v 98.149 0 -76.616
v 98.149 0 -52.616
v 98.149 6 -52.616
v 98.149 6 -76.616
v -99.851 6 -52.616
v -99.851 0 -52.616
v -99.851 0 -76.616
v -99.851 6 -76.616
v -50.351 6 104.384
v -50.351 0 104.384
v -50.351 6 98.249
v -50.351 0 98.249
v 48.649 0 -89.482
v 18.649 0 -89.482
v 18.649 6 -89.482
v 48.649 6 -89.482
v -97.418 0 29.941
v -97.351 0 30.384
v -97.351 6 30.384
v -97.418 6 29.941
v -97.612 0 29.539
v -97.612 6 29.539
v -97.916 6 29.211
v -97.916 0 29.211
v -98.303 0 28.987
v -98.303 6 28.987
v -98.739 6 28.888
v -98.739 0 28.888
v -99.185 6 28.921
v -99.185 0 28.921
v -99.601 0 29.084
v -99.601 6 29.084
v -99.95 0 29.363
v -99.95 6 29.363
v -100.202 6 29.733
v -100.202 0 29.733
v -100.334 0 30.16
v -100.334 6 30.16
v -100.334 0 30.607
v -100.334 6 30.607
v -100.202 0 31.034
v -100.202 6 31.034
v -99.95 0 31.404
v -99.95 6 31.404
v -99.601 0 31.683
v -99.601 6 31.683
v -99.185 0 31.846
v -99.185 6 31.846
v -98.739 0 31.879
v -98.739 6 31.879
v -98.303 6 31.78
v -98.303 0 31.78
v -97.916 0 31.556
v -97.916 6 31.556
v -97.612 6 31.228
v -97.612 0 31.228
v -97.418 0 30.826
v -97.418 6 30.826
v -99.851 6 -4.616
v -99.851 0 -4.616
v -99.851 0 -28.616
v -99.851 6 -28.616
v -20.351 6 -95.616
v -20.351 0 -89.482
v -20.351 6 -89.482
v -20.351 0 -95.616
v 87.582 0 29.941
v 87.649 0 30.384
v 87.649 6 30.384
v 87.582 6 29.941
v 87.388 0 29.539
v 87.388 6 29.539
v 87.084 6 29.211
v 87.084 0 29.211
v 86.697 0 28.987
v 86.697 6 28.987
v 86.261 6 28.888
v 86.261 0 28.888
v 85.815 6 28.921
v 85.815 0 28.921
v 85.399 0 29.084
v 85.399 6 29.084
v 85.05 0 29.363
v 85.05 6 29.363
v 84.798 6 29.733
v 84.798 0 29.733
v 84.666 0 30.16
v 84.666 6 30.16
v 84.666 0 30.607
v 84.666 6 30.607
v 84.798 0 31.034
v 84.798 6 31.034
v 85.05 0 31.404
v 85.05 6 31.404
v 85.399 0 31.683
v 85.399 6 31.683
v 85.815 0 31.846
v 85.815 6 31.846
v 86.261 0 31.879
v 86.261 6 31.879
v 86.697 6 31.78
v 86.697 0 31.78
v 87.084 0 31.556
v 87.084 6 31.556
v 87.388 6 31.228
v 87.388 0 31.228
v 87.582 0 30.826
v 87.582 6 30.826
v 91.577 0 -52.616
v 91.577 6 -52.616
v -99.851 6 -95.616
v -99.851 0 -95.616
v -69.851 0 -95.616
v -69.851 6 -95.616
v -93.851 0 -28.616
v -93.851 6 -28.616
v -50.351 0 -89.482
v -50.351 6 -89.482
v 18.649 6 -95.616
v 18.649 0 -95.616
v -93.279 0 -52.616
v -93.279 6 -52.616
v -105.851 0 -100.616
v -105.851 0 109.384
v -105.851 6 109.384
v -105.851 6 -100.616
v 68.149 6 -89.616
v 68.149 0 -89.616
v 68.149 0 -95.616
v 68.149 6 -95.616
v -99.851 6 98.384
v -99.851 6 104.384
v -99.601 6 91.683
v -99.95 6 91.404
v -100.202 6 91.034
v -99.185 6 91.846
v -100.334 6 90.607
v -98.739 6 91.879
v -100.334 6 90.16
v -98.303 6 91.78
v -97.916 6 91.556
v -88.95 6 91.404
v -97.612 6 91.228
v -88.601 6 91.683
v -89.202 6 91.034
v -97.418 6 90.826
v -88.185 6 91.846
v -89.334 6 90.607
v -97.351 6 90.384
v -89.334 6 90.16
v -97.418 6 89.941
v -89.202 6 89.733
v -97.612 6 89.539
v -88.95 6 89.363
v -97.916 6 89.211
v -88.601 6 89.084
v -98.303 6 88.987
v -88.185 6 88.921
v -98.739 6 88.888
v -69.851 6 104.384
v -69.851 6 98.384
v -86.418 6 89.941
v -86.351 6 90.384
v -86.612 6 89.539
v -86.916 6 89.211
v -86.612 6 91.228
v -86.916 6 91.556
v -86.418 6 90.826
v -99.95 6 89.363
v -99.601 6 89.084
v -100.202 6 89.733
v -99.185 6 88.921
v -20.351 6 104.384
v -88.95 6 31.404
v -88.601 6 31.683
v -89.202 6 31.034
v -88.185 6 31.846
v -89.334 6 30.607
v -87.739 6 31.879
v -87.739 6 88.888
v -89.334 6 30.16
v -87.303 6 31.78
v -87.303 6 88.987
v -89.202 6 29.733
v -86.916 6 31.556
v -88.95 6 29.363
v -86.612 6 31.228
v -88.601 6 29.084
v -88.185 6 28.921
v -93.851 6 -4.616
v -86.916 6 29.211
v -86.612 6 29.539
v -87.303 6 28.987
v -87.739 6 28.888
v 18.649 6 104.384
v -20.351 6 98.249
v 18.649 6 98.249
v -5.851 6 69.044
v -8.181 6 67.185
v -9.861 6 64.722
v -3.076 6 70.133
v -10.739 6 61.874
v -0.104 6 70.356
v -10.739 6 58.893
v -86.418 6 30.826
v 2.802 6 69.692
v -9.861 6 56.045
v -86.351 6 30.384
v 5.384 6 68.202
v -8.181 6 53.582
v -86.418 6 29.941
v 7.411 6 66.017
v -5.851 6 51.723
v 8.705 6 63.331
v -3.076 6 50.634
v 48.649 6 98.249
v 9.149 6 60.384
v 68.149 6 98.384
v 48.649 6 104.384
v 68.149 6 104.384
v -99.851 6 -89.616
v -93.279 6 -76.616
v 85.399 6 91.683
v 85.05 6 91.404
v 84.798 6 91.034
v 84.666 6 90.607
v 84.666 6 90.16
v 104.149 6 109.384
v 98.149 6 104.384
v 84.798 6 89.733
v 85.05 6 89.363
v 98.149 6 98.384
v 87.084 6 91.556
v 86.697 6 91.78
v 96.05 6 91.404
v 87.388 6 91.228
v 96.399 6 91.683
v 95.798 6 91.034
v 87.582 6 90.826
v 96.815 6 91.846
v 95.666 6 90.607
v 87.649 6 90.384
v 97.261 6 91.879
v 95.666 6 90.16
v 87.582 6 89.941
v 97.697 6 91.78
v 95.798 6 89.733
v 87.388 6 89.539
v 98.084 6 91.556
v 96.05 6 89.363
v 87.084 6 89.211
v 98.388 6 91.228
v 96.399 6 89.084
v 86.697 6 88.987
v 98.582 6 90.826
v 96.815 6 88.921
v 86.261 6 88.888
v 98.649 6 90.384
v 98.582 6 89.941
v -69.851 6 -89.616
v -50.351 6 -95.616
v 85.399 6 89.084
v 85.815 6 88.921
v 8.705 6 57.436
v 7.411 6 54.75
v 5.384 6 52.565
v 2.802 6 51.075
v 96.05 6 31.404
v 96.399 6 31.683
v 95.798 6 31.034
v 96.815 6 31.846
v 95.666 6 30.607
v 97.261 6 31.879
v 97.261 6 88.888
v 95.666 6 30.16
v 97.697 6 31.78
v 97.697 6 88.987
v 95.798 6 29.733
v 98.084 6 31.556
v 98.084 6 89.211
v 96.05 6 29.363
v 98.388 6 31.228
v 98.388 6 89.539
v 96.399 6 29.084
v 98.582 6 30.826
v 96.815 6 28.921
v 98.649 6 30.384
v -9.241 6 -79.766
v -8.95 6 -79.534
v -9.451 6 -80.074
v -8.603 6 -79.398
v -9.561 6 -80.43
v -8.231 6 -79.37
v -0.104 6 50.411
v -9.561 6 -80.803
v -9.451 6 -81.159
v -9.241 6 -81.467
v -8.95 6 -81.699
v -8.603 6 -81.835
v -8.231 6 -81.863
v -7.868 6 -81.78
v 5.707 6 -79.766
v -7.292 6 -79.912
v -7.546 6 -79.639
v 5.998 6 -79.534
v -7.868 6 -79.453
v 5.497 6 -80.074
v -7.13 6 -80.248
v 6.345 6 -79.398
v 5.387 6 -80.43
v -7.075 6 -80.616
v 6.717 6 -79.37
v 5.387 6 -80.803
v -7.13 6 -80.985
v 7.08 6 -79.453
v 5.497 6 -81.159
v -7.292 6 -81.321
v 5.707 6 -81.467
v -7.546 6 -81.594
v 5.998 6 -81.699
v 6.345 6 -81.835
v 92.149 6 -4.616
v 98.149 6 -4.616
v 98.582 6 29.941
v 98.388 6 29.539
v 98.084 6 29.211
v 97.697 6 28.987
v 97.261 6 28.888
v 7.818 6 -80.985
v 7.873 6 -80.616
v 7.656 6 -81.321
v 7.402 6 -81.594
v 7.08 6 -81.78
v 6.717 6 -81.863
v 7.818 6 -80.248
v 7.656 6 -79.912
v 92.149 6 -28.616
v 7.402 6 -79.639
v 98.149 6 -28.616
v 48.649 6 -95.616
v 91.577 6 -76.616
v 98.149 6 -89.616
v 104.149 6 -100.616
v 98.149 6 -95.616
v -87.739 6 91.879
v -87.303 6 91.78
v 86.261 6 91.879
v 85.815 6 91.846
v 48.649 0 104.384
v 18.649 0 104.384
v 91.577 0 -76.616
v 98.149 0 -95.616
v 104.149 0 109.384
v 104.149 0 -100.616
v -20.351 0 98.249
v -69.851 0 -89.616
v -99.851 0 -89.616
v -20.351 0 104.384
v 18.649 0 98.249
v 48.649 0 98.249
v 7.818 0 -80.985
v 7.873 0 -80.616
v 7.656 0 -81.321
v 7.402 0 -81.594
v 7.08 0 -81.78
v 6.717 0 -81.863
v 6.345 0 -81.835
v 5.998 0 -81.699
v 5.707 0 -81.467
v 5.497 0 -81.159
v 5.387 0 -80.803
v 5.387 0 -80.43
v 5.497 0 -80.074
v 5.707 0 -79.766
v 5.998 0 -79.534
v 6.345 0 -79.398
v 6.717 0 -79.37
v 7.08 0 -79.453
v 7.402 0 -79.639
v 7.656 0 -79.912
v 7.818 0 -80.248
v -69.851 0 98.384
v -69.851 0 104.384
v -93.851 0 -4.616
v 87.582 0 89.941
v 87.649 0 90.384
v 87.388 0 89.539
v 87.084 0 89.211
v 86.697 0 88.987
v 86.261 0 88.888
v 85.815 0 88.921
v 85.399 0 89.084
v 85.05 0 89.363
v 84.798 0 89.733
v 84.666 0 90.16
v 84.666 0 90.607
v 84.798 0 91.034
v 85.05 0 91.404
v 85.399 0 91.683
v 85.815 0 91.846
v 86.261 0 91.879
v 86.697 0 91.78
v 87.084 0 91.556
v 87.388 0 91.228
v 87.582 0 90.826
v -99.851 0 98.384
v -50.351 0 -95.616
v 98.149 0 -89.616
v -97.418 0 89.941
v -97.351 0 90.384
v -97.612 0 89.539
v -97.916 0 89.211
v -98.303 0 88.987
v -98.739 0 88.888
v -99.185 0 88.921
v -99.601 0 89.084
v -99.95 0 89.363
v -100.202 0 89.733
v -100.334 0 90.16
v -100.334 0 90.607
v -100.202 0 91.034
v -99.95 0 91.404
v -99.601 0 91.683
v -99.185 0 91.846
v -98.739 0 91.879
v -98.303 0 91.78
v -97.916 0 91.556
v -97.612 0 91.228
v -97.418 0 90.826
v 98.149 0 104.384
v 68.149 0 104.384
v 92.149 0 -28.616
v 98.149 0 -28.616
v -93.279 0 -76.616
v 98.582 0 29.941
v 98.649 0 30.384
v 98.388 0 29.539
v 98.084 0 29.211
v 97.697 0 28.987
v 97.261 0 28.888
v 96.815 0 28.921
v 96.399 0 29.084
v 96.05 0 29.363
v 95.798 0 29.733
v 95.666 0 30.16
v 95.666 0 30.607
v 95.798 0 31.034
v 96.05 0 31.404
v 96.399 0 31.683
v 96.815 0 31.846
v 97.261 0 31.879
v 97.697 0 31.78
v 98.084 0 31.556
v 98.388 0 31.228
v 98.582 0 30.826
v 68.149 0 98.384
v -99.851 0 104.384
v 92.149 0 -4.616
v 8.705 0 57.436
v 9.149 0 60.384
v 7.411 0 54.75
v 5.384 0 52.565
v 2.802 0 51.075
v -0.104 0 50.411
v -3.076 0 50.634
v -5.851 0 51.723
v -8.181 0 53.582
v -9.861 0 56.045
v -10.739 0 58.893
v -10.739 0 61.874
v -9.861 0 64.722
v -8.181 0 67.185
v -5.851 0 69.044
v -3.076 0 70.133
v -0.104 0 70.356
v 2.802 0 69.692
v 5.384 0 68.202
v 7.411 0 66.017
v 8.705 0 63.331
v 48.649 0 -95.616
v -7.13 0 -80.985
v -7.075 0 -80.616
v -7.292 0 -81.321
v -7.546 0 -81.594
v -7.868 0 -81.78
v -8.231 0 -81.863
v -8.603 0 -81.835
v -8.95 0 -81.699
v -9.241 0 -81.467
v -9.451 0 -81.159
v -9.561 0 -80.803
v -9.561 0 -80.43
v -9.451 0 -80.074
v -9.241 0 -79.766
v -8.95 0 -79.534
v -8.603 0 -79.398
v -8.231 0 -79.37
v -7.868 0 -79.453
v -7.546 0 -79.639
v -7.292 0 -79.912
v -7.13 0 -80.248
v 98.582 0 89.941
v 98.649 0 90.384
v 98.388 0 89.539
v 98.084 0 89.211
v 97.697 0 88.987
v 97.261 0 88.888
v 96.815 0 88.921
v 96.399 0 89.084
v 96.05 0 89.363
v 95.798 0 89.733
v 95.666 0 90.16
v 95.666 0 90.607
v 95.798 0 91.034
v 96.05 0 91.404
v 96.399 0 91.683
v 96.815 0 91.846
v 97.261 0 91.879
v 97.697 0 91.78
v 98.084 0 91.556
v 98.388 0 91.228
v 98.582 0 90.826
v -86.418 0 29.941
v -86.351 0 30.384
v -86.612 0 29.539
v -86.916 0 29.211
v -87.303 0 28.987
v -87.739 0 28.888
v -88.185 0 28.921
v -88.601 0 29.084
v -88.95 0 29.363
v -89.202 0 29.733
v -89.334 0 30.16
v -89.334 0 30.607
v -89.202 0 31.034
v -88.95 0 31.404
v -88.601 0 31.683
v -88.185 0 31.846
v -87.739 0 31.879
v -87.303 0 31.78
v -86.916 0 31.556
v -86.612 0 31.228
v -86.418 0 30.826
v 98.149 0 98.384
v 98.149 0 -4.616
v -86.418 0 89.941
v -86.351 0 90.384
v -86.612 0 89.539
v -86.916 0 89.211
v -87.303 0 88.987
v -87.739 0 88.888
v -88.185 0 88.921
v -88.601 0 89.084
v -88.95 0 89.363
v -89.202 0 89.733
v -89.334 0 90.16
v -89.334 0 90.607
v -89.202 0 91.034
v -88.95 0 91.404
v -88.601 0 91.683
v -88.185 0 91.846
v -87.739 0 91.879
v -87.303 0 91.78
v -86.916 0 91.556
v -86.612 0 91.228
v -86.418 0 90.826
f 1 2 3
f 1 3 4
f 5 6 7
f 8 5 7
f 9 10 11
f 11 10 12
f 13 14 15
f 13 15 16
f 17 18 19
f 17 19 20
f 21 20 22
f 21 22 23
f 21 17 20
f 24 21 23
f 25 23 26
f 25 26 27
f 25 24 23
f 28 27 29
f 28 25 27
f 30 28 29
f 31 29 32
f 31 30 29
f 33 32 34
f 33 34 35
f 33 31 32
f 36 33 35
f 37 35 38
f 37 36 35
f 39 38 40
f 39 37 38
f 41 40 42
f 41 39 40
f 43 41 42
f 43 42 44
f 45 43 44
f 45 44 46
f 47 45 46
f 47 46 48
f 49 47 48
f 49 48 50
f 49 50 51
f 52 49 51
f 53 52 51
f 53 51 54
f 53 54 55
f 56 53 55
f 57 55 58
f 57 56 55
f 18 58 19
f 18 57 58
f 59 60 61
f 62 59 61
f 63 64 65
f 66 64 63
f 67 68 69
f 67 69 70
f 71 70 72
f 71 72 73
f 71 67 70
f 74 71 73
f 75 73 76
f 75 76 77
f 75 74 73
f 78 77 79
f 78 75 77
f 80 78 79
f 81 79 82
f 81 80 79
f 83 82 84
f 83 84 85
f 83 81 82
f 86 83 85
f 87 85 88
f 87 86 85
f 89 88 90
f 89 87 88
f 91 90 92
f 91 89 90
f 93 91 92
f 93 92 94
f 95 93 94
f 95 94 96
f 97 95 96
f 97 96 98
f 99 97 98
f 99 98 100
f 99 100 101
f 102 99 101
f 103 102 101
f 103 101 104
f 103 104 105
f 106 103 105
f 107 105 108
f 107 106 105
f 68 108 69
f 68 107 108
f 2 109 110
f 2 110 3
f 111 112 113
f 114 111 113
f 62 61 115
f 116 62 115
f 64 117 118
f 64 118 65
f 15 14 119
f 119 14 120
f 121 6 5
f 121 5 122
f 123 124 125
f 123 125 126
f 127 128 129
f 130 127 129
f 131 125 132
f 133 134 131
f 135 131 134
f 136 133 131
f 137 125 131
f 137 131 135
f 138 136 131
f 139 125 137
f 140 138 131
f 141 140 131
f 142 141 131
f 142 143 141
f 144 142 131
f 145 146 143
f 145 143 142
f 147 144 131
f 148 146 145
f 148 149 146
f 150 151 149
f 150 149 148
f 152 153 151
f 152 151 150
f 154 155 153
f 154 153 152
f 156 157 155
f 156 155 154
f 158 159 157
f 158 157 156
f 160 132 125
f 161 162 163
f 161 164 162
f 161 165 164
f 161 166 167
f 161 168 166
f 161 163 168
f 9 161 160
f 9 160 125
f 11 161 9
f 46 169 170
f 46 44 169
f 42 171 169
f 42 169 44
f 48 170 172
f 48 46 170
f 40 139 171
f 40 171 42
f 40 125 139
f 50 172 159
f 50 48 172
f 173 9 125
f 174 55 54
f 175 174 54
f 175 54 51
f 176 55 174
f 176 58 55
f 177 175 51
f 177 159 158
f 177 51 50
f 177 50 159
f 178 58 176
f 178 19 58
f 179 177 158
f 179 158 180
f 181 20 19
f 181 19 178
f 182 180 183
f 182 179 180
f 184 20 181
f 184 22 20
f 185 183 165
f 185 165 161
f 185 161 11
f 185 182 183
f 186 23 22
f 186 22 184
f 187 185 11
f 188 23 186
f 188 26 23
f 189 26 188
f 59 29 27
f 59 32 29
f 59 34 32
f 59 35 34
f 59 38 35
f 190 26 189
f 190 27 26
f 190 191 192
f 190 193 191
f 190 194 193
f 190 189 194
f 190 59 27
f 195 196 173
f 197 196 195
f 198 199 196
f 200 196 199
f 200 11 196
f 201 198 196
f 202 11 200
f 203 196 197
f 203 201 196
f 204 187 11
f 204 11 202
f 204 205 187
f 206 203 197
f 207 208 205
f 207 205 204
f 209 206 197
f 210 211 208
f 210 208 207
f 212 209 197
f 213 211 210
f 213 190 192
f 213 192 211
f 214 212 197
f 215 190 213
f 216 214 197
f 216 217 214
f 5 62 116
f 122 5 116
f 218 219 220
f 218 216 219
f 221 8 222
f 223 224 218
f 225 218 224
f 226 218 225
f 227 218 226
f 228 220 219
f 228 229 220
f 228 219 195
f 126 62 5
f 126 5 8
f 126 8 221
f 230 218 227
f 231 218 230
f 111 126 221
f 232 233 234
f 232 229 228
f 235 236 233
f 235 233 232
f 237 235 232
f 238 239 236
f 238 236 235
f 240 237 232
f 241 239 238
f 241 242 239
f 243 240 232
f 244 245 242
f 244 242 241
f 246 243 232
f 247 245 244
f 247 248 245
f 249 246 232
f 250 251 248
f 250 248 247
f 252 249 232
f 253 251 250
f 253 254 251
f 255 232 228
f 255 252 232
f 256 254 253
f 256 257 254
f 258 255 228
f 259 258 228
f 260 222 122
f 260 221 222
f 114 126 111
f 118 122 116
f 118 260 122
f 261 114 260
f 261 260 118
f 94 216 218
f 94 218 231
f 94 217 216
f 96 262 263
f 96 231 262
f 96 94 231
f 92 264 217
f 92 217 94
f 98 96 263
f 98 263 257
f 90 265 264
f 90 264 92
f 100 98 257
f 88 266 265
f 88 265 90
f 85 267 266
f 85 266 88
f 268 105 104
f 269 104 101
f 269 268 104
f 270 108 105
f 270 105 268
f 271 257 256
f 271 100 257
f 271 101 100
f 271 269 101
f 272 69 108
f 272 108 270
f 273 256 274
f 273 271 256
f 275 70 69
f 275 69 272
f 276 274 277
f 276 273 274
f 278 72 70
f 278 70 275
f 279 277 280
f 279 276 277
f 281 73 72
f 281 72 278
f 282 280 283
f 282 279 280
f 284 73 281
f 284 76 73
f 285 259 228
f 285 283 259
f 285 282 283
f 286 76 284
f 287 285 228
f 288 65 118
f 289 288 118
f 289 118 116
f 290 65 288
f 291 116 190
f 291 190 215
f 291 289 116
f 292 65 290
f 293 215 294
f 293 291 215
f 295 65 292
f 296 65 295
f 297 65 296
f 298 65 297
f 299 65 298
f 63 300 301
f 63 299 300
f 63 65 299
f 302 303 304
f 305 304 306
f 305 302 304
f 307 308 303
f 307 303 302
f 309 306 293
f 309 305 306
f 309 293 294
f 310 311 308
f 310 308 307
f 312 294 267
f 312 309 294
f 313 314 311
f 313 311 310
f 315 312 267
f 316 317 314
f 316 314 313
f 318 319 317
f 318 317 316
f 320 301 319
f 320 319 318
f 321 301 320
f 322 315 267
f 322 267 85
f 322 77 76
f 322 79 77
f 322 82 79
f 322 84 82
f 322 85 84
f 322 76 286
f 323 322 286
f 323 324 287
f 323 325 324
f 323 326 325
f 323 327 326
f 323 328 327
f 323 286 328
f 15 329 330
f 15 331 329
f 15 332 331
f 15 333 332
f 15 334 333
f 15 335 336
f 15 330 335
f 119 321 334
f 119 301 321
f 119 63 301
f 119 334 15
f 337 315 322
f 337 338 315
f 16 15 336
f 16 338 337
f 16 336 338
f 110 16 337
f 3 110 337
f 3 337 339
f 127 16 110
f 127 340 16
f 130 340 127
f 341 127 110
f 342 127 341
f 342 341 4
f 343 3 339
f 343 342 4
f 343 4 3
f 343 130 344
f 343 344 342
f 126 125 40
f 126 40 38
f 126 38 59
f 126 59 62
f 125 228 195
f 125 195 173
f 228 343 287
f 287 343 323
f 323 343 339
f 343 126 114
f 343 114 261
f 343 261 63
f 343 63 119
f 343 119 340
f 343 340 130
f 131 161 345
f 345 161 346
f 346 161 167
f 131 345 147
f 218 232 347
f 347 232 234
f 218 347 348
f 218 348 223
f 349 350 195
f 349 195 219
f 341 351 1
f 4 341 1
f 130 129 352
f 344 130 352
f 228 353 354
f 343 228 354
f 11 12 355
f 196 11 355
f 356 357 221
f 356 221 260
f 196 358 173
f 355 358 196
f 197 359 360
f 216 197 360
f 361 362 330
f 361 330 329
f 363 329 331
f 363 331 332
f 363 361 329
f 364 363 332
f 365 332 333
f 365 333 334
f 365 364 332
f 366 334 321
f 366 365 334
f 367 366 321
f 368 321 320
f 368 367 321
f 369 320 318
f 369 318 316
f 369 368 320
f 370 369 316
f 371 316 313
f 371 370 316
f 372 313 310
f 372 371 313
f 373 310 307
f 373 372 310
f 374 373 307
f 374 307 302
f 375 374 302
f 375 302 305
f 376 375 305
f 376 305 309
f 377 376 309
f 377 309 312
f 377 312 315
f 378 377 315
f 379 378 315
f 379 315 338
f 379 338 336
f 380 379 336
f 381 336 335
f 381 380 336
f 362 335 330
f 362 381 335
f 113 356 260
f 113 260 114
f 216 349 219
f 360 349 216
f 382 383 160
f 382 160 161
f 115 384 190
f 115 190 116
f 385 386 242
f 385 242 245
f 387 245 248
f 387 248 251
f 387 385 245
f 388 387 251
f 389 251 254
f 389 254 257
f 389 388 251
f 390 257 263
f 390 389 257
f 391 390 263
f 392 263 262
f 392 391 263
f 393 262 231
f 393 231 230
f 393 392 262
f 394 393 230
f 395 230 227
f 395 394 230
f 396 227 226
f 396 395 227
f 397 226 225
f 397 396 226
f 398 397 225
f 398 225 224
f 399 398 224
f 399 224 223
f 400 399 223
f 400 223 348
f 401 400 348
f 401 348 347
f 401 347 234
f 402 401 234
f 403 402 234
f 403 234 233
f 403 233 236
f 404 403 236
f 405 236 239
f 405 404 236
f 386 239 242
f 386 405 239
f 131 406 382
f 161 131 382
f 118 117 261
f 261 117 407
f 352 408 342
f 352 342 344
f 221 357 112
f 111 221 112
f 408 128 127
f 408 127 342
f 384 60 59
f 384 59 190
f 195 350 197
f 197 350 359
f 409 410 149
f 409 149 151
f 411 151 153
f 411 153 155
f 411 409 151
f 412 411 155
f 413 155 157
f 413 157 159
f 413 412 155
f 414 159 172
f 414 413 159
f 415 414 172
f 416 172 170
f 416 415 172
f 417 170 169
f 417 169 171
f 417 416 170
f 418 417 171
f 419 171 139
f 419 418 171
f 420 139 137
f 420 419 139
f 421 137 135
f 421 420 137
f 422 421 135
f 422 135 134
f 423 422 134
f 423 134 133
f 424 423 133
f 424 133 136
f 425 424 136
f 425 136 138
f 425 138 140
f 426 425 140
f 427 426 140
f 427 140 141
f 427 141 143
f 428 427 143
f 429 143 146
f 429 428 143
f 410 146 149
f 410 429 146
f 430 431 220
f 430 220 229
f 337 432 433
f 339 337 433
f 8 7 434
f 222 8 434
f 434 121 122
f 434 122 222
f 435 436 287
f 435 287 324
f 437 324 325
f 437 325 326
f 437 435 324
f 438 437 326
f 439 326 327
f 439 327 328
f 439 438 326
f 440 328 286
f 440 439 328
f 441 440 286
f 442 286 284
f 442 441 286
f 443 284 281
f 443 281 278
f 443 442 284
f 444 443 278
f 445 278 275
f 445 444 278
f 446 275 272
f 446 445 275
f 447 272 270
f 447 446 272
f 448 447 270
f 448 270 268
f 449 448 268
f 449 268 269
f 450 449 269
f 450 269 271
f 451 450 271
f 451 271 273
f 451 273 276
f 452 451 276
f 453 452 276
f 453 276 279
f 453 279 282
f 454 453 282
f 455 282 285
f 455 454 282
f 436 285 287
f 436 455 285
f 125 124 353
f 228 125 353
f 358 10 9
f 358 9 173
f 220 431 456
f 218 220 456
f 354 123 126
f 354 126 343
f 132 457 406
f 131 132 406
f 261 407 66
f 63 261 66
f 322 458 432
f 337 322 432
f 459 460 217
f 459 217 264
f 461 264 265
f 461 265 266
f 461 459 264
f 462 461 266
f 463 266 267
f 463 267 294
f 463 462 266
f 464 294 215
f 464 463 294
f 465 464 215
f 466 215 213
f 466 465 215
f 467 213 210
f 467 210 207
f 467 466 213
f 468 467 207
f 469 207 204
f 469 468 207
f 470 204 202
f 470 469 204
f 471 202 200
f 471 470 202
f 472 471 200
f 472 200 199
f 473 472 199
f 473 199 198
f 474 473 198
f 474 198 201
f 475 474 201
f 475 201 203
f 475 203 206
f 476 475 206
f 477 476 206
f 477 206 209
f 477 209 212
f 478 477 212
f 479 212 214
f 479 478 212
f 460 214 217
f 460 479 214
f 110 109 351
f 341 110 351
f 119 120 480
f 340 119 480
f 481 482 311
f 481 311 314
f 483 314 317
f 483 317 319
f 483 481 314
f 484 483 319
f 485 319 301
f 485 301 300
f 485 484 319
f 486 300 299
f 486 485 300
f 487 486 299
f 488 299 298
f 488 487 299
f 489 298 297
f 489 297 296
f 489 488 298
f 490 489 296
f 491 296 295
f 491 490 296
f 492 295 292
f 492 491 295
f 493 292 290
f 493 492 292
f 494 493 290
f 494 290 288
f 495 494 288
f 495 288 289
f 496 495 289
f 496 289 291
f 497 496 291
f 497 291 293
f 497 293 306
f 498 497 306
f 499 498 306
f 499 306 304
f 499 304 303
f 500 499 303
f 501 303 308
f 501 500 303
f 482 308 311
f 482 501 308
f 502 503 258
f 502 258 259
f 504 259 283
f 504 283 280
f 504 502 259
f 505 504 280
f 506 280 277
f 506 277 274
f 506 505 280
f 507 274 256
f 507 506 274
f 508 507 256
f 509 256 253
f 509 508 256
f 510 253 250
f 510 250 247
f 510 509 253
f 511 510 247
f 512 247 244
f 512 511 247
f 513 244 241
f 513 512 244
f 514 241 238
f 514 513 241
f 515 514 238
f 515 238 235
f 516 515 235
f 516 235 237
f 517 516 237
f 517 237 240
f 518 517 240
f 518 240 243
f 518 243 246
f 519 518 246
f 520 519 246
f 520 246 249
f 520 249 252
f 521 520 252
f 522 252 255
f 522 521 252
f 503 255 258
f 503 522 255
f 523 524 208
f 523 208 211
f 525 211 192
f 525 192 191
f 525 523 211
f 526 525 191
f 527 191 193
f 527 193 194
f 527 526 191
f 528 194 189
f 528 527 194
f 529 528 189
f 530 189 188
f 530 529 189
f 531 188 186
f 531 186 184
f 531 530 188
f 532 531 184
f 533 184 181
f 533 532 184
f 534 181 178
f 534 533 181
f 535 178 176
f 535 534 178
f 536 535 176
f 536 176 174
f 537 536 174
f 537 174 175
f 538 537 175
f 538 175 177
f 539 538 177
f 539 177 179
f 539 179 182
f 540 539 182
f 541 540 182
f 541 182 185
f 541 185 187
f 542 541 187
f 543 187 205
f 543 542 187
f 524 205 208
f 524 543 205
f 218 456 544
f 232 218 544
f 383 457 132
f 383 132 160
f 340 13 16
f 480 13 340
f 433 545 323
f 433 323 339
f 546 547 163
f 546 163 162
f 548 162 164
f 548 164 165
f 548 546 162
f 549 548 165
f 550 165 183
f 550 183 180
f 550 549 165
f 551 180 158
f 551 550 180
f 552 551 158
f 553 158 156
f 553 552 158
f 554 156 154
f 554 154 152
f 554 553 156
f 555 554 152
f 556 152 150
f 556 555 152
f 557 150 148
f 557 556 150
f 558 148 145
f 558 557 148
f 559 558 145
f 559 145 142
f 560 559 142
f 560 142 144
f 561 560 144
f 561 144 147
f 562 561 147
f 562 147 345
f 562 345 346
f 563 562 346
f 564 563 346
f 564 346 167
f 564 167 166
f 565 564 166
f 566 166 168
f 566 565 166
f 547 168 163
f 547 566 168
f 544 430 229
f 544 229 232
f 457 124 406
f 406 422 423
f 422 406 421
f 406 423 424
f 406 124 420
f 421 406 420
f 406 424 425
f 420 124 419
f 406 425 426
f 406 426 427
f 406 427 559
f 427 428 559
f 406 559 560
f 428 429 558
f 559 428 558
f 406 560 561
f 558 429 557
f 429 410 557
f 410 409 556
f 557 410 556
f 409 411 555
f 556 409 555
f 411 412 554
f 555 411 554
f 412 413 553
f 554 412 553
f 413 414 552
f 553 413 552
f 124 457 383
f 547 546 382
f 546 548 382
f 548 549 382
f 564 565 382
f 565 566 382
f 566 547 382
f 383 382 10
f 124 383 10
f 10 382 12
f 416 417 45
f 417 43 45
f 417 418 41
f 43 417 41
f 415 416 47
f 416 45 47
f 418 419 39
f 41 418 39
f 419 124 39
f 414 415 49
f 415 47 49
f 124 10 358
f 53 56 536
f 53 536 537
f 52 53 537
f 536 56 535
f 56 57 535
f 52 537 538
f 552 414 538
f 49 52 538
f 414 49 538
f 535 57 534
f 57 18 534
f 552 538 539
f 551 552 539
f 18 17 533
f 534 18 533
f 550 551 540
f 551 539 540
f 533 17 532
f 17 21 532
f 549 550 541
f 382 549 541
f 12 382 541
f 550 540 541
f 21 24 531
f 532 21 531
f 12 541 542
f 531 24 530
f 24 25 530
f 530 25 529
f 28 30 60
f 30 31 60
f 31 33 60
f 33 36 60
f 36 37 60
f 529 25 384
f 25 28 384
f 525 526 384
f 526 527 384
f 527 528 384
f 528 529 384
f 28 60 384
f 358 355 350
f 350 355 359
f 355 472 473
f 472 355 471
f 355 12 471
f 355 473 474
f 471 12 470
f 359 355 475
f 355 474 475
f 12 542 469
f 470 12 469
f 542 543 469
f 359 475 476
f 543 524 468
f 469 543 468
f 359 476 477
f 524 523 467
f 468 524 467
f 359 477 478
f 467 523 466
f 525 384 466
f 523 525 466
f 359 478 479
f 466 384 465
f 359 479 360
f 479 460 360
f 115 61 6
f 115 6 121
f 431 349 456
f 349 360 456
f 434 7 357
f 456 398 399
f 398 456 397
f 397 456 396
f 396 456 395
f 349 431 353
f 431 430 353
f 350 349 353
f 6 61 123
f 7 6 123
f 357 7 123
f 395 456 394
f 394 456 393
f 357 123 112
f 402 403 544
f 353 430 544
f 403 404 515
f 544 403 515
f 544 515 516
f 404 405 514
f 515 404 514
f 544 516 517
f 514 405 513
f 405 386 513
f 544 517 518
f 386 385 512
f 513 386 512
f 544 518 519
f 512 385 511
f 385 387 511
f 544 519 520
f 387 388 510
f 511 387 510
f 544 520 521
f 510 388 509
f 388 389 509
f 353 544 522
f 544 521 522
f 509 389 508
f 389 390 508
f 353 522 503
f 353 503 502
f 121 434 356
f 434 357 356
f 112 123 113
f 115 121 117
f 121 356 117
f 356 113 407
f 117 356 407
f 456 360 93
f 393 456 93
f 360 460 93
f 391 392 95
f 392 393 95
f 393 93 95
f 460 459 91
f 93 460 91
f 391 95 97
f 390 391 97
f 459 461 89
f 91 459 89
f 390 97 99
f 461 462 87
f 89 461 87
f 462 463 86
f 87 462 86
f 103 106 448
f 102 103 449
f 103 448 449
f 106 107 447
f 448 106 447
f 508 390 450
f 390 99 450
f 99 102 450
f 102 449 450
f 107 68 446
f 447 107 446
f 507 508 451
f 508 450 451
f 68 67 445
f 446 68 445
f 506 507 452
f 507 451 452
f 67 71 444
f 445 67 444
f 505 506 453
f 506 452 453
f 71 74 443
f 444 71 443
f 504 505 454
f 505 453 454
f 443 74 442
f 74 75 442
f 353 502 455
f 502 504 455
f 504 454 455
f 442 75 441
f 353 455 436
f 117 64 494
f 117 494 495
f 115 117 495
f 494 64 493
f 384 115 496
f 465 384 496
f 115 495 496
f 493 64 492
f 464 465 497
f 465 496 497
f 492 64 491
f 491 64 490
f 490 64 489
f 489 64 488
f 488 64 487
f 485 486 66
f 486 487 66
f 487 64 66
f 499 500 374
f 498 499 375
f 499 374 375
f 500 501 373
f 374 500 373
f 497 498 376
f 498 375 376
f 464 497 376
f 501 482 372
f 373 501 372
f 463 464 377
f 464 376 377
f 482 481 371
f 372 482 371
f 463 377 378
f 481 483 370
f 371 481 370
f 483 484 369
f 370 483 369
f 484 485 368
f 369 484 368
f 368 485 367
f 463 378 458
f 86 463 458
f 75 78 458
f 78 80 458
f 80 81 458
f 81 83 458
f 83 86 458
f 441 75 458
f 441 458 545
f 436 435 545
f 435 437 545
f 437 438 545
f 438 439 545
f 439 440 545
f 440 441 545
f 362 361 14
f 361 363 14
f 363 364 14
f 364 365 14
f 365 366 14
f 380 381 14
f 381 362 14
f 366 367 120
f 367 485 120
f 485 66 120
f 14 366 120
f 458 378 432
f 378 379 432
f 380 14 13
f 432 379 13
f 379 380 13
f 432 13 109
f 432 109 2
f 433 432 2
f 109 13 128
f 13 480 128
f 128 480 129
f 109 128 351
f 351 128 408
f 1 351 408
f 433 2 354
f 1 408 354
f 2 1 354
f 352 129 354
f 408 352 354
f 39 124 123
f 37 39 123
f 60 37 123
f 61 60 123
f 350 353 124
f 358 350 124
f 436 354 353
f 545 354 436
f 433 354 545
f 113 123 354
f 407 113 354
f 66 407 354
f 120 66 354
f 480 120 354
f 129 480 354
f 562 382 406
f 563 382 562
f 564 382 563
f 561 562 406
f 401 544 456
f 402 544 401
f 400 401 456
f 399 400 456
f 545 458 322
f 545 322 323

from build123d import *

# Parameters (mm, degrees)
SKETCH1_W           = 210
SKETCH1_H           = 210
SKETCH1_R           = 1.5
SKETCH1_R_2         = 10
SKETCH1_R_3         = 1.25
SKETCH1_W_2         = 30
SKETCH1_H_2         = 6.134133664
SKETCH1_H_3         = 6
SKETCH1_W_3         = 6.572229622
SKETCH1_H_4         = 24
SKETCH1_W_4         = 6
BOSS_EXTRUDE1_DEPTH = 6


with BuildPart() as part:
    # Sketch1 → Boss-Extrude1 (new body)
    with BuildSketch(Plane(origin=(0, 0, 0), x_dir=(1, 0, 0), z_dir=(0, 1, 0))):
        with Locations((-0.850910849, -4.383508225)):
            Rectangle(SKETCH1_W, SKETCH1_H)
        with Locations((-98.850910849, -90.383508225)):
            Circle(SKETCH1_R, mode=Mode.SUBTRACT)
        with Locations((-87.850910849, -90.383508225)):
            Circle(SKETCH1_R, mode=Mode.SUBTRACT)
        with Locations((-0.850910849, -60.383508225)):
            Circle(SKETCH1_R_2, mode=Mode.SUBTRACT)
        with Locations((-87.850910849, -30.383508225)):
            Circle(SKETCH1_R, mode=Mode.SUBTRACT)
        with Locations((-98.850910849, -30.383508225)):
            Circle(SKETCH1_R, mode=Mode.SUBTRACT)
        with Locations((97.149089151, -90.383508225)):
            Circle(SKETCH1_R, mode=Mode.SUBTRACT)
        with Locations((86.149089151, -90.383508225)):
            Circle(SKETCH1_R, mode=Mode.SUBTRACT)
        with Locations((86.149089151, -30.383508225)):
            Circle(SKETCH1_R, mode=Mode.SUBTRACT)
        with Locations((97.149089151, -30.383508225)):
            Circle(SKETCH1_R, mode=Mode.SUBTRACT)
        with Locations((-8.324910849, 80.616491775)):
            Circle(SKETCH1_R_3, mode=Mode.SUBTRACT)
        with Locations((6.623089151, 80.616491775)):
            Circle(SKETCH1_R_3, mode=Mode.SUBTRACT)
        with Locations((-35.350910849, 92.549424943)):
            Rectangle(SKETCH1_W_2, SKETCH1_H_2, mode=Mode.SUBTRACT)
        with Locations((-84.850910849, 92.616491775)):
            Rectangle(SKETCH1_W_2, SKETCH1_H_3, mode=Mode.SUBTRACT)
        with Locations((33.649089151, 92.549424943)):
            Rectangle(SKETCH1_W_2, SKETCH1_H_2, mode=Mode.SUBTRACT)
        with Locations((83.149089151, 92.616491775)):
            Rectangle(SKETCH1_W_2, SKETCH1_H_3, mode=Mode.SUBTRACT)
        with Locations((83.149089151, -101.383508225)):
            Rectangle(SKETCH1_W_2, SKETCH1_H_3, mode=Mode.SUBTRACT)
        with Locations((33.649089151, -101.316441393)):
            Rectangle(SKETCH1_W_2, SKETCH1_H_2, mode=Mode.SUBTRACT)
        with Locations((-35.350910849, -101.316441393)):
            Rectangle(SKETCH1_W_2, SKETCH1_H_2, mode=Mode.SUBTRACT)
        with Locations((-84.850910849, -101.383508225)):
            Rectangle(SKETCH1_W_2, SKETCH1_H_3, mode=Mode.SUBTRACT)
        with Locations((-96.564796038, 64.616491775)):
            Rectangle(SKETCH1_W_3, SKETCH1_H_4, mode=Mode.SUBTRACT)
        with Locations((-96.850910849, 16.616491775)):
            Rectangle(SKETCH1_W_4, SKETCH1_H_4, mode=Mode.SUBTRACT)
        with Locations((95.149089151, 16.616491775)):
            Rectangle(SKETCH1_W_4, SKETCH1_H_4, mode=Mode.SUBTRACT)
        with Locations((94.86297434, 64.616491775)):
            Rectangle(SKETCH1_W_3, SKETCH1_H_4, mode=Mode.SUBTRACT)
    extrude(amount=BOSS_EXTRUDE1_DEPTH)


solid = part.part
